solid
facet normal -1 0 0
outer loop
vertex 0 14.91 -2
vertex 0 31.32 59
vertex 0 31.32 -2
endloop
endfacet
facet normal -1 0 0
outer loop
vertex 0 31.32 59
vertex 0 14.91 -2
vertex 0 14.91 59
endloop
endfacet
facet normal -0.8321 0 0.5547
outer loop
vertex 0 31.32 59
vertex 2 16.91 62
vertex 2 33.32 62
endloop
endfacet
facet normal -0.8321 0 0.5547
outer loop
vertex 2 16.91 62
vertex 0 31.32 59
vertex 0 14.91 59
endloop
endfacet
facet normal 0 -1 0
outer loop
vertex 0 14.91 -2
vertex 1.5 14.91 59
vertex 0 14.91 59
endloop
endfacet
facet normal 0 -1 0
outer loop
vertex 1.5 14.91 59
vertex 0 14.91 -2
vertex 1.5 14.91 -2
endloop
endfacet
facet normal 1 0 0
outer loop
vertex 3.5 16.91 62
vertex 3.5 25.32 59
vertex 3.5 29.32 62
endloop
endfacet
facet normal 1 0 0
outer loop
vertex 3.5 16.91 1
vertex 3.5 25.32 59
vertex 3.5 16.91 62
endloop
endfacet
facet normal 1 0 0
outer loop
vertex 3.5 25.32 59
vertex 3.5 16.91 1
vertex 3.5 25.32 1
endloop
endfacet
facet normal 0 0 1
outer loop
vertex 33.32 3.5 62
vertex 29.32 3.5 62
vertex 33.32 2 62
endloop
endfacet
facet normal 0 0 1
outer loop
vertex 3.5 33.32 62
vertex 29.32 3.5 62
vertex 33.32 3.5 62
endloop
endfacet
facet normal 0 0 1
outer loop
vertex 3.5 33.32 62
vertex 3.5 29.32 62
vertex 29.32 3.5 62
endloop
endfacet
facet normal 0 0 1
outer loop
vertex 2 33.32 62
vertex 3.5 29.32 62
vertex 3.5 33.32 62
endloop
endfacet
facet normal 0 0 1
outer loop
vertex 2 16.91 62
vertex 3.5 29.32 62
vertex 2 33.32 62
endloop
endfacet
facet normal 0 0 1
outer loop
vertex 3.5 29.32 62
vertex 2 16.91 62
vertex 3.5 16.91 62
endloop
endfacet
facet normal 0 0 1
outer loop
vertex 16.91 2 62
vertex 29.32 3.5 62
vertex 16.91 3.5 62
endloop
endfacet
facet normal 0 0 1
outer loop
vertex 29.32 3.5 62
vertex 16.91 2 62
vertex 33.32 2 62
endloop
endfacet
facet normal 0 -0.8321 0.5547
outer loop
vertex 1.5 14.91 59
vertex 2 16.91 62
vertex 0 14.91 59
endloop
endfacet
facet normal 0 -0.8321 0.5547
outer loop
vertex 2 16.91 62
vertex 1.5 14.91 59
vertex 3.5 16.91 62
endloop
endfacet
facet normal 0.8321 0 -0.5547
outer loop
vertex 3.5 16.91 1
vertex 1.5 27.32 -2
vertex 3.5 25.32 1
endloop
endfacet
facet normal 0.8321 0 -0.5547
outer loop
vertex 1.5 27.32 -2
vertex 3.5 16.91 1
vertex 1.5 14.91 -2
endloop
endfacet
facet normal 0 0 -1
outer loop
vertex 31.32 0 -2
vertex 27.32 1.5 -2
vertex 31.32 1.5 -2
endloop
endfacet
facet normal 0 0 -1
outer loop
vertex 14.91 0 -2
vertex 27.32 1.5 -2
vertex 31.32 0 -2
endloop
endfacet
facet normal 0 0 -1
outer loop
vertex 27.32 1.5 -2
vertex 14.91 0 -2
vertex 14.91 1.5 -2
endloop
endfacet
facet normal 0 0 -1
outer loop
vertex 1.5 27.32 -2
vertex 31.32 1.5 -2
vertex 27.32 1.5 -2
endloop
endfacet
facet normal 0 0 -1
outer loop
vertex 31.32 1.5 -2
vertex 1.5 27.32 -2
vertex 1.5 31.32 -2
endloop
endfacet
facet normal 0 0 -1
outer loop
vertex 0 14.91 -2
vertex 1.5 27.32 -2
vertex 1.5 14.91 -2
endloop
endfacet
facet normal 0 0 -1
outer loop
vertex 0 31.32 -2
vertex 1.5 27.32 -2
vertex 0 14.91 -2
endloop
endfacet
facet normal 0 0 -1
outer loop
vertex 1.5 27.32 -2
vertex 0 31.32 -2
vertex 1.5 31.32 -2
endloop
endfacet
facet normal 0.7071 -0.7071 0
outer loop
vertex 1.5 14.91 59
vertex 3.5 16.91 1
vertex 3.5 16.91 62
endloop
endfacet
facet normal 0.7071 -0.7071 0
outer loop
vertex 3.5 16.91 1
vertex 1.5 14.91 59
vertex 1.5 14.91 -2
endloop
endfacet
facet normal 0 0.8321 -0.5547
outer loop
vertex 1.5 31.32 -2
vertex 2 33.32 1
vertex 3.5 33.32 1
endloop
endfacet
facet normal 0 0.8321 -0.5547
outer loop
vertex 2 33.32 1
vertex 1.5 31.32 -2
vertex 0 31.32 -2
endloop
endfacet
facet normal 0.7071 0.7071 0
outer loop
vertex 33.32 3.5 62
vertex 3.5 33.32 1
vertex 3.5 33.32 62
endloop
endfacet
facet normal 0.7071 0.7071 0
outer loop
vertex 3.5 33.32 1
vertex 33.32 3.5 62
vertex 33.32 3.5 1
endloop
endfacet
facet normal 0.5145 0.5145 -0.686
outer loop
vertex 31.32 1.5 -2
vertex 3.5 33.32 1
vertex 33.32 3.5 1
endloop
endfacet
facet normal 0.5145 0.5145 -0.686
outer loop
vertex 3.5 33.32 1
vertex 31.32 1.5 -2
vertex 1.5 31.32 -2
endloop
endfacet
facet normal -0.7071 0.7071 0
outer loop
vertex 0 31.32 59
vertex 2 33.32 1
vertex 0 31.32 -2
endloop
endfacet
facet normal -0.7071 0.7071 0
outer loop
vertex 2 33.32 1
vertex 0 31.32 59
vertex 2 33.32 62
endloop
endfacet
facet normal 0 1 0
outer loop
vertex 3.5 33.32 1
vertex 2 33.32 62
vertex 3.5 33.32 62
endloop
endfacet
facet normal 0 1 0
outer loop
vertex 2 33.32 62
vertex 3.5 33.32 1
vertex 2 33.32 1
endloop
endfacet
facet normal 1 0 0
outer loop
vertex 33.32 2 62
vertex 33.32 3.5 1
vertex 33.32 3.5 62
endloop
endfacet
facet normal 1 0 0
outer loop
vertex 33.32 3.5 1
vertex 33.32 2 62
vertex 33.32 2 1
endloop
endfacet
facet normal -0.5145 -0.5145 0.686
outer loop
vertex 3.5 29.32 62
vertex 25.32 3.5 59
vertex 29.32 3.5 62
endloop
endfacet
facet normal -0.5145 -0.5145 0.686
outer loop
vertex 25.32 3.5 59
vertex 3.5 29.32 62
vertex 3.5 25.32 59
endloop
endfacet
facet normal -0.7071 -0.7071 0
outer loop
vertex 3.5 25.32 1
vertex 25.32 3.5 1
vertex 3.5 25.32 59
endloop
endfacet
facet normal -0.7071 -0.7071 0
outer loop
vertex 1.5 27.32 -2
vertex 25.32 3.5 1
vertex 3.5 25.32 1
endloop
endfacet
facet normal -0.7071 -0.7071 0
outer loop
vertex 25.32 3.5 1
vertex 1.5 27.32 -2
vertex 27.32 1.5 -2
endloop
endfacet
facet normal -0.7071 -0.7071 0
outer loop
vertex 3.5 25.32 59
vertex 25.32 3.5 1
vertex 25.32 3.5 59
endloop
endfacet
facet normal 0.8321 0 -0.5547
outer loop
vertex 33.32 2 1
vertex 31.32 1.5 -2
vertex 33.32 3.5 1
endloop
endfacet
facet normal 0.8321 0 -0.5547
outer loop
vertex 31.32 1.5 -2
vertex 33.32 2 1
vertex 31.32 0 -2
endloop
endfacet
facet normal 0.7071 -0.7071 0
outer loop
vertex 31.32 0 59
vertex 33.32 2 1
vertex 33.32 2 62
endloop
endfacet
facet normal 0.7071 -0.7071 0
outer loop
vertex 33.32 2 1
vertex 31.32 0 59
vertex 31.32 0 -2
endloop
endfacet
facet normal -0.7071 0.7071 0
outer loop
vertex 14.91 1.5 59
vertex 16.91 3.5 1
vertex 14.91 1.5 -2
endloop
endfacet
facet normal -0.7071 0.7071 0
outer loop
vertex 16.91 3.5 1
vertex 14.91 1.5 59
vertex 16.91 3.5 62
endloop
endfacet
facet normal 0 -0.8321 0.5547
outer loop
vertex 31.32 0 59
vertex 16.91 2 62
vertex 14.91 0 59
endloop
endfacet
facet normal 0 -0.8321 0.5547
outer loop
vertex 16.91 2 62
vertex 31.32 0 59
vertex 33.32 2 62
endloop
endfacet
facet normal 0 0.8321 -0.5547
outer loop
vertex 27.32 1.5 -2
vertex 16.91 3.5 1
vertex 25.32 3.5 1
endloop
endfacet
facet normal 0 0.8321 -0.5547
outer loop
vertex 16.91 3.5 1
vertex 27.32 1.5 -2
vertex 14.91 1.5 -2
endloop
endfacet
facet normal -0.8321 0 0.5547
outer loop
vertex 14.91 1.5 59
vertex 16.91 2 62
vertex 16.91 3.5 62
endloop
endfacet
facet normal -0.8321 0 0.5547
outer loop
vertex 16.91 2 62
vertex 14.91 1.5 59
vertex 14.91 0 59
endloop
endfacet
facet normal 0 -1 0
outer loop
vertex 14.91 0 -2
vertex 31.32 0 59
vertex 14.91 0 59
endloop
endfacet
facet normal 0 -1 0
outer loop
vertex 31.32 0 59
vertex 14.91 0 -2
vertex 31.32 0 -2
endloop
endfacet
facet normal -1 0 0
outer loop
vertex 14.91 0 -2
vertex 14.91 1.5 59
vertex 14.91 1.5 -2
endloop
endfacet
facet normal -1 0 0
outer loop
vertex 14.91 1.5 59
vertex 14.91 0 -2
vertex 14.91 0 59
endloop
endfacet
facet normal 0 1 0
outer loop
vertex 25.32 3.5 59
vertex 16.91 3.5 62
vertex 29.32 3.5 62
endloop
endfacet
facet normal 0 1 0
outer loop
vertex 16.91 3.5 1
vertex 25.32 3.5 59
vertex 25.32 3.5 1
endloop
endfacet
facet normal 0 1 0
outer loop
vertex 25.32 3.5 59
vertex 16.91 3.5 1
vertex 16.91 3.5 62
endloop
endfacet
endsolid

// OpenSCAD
// Vent channels to pass air over stepper motors from electronics fan.

//render_part="channel_section_2d";
//render_part="channel_inner_mask_2d";
render_part="channel_section";
render_part="channel_sectionx4";
render_part="channel_section_tapered";

vent_xy=29.82; // From laser cut DXF source files
vent2stepper=186.5;

channel_th=2.0; // Channel wall thickness

module channel_section_2d(vent_xy=vent_xy,channel_th=channel_th) {
  hull() {
    translate([0,vent_xy-channel_th]) square([channel_th,2*channel_th],center=false);
    translate([vent_xy-channel_th,0]) square([2*channel_th,channel_th],center=false);
  }
  hull() {
    translate([0,vent_xy/2]) square([channel_th,channel_th],center=false);
    translate([0,vent_xy]) square([channel_th,channel_th],center=false);
  }
  hull() {
    translate([vent_xy/2,0]) square([channel_th,channel_th],center=false);
    translate([vent_xy,0]) square([channel_th,channel_th],center=false);
  }
}

if(render_part=="channel_section_2d") {
  echo("Rendering channel_section_2d()...");
  channel_section_2d();
}

module channel_inner_mask_2d(vent_xy=vent_xy,channel_th=channel_th) {
  polygon(points=[ [0,0],[0,vent_xy],[vent_xy,0] ],paths=[[0,1,2]]);
}

if(render_part=="channel_inner_mask_2d") {
  echo("Rendering channel_inner_mask_2d()...");
  channel_inner_mask_2d();
}

module channel_section(h=60.0,vent_xy=vent_xy,channel_th=channel_th) {
  difference() {
    union() {
      linear_extrude(height=h) render() channel_section_2d(vent_xy=vent_xy,channel_th=channel_th);
      translate([0,0,h-2*channel_th]) linear_extrude(height=3*channel_th) render() intersection() {
	  channel_section_2d(vent_xy=vent_xy,channel_th=2*channel_th);
	  channel_inner_mask_2d(vent_xy=vent_xy,channel_th=channel_th);
	  translate([channel_th,channel_th]) channel_inner_mask_2d(vent_xy=vent_xy-channel_th,channel_th=channel_th);
      }
    }
    translate([0,0,-channel_th]) linear_extrude(height=2*channel_th) render() intersection() {
	channel_section_2d(vent_xy=vent_xy,channel_th=2*channel_th);
	channel_inner_mask_2d(vent_xy=vent_xy,channel_th=channel_th);
	translate([channel_th,channel_th]) channel_inner_mask_2d(vent_xy=vent_xy-channel_th,channel_th=channel_th);
    }
  }
}

if(render_part=="channel_section") {
  echo("Rendering channel_section()...");
  channel_section();
}


if(render_part=="channel_sectionx4") {
  echo("Rendering channel_section() x4...");
  for(i=[0:3]) rotate([0,0,i*360/4]) translate([channel_th,channel_th,0]) 
    channel_section();
}

module channel_taper(vent_xy=vent_xy,channel_th=channel_th) {
  hull() {
    translate([0,0,-2*channel_th]) cube([channel_th/2,channel_th/2,channel_th],center=false);
    translate([2*channel_th,2*channel_th,channel_th]) cube([channel_th/2,channel_th/2,channel_th],center=false);
  }
}

module channel_section_tapered(h=60.0,vent_xy=vent_xy,channel_th=channel_th) {
  minkowski() {
    linear_extrude(height=h) render() channel_section_2d(vent_xy=vent_xy,channel_th=channel_th/2);
    channel_taper(vent_xy=vent_xy,channel_th=channel_th/2);
  }
}

if(render_part=="channel_section_tapered") {
  echo("Rendering channel_section_tapered()...");
  % channel_taper();
  channel_section_tapered();
}
